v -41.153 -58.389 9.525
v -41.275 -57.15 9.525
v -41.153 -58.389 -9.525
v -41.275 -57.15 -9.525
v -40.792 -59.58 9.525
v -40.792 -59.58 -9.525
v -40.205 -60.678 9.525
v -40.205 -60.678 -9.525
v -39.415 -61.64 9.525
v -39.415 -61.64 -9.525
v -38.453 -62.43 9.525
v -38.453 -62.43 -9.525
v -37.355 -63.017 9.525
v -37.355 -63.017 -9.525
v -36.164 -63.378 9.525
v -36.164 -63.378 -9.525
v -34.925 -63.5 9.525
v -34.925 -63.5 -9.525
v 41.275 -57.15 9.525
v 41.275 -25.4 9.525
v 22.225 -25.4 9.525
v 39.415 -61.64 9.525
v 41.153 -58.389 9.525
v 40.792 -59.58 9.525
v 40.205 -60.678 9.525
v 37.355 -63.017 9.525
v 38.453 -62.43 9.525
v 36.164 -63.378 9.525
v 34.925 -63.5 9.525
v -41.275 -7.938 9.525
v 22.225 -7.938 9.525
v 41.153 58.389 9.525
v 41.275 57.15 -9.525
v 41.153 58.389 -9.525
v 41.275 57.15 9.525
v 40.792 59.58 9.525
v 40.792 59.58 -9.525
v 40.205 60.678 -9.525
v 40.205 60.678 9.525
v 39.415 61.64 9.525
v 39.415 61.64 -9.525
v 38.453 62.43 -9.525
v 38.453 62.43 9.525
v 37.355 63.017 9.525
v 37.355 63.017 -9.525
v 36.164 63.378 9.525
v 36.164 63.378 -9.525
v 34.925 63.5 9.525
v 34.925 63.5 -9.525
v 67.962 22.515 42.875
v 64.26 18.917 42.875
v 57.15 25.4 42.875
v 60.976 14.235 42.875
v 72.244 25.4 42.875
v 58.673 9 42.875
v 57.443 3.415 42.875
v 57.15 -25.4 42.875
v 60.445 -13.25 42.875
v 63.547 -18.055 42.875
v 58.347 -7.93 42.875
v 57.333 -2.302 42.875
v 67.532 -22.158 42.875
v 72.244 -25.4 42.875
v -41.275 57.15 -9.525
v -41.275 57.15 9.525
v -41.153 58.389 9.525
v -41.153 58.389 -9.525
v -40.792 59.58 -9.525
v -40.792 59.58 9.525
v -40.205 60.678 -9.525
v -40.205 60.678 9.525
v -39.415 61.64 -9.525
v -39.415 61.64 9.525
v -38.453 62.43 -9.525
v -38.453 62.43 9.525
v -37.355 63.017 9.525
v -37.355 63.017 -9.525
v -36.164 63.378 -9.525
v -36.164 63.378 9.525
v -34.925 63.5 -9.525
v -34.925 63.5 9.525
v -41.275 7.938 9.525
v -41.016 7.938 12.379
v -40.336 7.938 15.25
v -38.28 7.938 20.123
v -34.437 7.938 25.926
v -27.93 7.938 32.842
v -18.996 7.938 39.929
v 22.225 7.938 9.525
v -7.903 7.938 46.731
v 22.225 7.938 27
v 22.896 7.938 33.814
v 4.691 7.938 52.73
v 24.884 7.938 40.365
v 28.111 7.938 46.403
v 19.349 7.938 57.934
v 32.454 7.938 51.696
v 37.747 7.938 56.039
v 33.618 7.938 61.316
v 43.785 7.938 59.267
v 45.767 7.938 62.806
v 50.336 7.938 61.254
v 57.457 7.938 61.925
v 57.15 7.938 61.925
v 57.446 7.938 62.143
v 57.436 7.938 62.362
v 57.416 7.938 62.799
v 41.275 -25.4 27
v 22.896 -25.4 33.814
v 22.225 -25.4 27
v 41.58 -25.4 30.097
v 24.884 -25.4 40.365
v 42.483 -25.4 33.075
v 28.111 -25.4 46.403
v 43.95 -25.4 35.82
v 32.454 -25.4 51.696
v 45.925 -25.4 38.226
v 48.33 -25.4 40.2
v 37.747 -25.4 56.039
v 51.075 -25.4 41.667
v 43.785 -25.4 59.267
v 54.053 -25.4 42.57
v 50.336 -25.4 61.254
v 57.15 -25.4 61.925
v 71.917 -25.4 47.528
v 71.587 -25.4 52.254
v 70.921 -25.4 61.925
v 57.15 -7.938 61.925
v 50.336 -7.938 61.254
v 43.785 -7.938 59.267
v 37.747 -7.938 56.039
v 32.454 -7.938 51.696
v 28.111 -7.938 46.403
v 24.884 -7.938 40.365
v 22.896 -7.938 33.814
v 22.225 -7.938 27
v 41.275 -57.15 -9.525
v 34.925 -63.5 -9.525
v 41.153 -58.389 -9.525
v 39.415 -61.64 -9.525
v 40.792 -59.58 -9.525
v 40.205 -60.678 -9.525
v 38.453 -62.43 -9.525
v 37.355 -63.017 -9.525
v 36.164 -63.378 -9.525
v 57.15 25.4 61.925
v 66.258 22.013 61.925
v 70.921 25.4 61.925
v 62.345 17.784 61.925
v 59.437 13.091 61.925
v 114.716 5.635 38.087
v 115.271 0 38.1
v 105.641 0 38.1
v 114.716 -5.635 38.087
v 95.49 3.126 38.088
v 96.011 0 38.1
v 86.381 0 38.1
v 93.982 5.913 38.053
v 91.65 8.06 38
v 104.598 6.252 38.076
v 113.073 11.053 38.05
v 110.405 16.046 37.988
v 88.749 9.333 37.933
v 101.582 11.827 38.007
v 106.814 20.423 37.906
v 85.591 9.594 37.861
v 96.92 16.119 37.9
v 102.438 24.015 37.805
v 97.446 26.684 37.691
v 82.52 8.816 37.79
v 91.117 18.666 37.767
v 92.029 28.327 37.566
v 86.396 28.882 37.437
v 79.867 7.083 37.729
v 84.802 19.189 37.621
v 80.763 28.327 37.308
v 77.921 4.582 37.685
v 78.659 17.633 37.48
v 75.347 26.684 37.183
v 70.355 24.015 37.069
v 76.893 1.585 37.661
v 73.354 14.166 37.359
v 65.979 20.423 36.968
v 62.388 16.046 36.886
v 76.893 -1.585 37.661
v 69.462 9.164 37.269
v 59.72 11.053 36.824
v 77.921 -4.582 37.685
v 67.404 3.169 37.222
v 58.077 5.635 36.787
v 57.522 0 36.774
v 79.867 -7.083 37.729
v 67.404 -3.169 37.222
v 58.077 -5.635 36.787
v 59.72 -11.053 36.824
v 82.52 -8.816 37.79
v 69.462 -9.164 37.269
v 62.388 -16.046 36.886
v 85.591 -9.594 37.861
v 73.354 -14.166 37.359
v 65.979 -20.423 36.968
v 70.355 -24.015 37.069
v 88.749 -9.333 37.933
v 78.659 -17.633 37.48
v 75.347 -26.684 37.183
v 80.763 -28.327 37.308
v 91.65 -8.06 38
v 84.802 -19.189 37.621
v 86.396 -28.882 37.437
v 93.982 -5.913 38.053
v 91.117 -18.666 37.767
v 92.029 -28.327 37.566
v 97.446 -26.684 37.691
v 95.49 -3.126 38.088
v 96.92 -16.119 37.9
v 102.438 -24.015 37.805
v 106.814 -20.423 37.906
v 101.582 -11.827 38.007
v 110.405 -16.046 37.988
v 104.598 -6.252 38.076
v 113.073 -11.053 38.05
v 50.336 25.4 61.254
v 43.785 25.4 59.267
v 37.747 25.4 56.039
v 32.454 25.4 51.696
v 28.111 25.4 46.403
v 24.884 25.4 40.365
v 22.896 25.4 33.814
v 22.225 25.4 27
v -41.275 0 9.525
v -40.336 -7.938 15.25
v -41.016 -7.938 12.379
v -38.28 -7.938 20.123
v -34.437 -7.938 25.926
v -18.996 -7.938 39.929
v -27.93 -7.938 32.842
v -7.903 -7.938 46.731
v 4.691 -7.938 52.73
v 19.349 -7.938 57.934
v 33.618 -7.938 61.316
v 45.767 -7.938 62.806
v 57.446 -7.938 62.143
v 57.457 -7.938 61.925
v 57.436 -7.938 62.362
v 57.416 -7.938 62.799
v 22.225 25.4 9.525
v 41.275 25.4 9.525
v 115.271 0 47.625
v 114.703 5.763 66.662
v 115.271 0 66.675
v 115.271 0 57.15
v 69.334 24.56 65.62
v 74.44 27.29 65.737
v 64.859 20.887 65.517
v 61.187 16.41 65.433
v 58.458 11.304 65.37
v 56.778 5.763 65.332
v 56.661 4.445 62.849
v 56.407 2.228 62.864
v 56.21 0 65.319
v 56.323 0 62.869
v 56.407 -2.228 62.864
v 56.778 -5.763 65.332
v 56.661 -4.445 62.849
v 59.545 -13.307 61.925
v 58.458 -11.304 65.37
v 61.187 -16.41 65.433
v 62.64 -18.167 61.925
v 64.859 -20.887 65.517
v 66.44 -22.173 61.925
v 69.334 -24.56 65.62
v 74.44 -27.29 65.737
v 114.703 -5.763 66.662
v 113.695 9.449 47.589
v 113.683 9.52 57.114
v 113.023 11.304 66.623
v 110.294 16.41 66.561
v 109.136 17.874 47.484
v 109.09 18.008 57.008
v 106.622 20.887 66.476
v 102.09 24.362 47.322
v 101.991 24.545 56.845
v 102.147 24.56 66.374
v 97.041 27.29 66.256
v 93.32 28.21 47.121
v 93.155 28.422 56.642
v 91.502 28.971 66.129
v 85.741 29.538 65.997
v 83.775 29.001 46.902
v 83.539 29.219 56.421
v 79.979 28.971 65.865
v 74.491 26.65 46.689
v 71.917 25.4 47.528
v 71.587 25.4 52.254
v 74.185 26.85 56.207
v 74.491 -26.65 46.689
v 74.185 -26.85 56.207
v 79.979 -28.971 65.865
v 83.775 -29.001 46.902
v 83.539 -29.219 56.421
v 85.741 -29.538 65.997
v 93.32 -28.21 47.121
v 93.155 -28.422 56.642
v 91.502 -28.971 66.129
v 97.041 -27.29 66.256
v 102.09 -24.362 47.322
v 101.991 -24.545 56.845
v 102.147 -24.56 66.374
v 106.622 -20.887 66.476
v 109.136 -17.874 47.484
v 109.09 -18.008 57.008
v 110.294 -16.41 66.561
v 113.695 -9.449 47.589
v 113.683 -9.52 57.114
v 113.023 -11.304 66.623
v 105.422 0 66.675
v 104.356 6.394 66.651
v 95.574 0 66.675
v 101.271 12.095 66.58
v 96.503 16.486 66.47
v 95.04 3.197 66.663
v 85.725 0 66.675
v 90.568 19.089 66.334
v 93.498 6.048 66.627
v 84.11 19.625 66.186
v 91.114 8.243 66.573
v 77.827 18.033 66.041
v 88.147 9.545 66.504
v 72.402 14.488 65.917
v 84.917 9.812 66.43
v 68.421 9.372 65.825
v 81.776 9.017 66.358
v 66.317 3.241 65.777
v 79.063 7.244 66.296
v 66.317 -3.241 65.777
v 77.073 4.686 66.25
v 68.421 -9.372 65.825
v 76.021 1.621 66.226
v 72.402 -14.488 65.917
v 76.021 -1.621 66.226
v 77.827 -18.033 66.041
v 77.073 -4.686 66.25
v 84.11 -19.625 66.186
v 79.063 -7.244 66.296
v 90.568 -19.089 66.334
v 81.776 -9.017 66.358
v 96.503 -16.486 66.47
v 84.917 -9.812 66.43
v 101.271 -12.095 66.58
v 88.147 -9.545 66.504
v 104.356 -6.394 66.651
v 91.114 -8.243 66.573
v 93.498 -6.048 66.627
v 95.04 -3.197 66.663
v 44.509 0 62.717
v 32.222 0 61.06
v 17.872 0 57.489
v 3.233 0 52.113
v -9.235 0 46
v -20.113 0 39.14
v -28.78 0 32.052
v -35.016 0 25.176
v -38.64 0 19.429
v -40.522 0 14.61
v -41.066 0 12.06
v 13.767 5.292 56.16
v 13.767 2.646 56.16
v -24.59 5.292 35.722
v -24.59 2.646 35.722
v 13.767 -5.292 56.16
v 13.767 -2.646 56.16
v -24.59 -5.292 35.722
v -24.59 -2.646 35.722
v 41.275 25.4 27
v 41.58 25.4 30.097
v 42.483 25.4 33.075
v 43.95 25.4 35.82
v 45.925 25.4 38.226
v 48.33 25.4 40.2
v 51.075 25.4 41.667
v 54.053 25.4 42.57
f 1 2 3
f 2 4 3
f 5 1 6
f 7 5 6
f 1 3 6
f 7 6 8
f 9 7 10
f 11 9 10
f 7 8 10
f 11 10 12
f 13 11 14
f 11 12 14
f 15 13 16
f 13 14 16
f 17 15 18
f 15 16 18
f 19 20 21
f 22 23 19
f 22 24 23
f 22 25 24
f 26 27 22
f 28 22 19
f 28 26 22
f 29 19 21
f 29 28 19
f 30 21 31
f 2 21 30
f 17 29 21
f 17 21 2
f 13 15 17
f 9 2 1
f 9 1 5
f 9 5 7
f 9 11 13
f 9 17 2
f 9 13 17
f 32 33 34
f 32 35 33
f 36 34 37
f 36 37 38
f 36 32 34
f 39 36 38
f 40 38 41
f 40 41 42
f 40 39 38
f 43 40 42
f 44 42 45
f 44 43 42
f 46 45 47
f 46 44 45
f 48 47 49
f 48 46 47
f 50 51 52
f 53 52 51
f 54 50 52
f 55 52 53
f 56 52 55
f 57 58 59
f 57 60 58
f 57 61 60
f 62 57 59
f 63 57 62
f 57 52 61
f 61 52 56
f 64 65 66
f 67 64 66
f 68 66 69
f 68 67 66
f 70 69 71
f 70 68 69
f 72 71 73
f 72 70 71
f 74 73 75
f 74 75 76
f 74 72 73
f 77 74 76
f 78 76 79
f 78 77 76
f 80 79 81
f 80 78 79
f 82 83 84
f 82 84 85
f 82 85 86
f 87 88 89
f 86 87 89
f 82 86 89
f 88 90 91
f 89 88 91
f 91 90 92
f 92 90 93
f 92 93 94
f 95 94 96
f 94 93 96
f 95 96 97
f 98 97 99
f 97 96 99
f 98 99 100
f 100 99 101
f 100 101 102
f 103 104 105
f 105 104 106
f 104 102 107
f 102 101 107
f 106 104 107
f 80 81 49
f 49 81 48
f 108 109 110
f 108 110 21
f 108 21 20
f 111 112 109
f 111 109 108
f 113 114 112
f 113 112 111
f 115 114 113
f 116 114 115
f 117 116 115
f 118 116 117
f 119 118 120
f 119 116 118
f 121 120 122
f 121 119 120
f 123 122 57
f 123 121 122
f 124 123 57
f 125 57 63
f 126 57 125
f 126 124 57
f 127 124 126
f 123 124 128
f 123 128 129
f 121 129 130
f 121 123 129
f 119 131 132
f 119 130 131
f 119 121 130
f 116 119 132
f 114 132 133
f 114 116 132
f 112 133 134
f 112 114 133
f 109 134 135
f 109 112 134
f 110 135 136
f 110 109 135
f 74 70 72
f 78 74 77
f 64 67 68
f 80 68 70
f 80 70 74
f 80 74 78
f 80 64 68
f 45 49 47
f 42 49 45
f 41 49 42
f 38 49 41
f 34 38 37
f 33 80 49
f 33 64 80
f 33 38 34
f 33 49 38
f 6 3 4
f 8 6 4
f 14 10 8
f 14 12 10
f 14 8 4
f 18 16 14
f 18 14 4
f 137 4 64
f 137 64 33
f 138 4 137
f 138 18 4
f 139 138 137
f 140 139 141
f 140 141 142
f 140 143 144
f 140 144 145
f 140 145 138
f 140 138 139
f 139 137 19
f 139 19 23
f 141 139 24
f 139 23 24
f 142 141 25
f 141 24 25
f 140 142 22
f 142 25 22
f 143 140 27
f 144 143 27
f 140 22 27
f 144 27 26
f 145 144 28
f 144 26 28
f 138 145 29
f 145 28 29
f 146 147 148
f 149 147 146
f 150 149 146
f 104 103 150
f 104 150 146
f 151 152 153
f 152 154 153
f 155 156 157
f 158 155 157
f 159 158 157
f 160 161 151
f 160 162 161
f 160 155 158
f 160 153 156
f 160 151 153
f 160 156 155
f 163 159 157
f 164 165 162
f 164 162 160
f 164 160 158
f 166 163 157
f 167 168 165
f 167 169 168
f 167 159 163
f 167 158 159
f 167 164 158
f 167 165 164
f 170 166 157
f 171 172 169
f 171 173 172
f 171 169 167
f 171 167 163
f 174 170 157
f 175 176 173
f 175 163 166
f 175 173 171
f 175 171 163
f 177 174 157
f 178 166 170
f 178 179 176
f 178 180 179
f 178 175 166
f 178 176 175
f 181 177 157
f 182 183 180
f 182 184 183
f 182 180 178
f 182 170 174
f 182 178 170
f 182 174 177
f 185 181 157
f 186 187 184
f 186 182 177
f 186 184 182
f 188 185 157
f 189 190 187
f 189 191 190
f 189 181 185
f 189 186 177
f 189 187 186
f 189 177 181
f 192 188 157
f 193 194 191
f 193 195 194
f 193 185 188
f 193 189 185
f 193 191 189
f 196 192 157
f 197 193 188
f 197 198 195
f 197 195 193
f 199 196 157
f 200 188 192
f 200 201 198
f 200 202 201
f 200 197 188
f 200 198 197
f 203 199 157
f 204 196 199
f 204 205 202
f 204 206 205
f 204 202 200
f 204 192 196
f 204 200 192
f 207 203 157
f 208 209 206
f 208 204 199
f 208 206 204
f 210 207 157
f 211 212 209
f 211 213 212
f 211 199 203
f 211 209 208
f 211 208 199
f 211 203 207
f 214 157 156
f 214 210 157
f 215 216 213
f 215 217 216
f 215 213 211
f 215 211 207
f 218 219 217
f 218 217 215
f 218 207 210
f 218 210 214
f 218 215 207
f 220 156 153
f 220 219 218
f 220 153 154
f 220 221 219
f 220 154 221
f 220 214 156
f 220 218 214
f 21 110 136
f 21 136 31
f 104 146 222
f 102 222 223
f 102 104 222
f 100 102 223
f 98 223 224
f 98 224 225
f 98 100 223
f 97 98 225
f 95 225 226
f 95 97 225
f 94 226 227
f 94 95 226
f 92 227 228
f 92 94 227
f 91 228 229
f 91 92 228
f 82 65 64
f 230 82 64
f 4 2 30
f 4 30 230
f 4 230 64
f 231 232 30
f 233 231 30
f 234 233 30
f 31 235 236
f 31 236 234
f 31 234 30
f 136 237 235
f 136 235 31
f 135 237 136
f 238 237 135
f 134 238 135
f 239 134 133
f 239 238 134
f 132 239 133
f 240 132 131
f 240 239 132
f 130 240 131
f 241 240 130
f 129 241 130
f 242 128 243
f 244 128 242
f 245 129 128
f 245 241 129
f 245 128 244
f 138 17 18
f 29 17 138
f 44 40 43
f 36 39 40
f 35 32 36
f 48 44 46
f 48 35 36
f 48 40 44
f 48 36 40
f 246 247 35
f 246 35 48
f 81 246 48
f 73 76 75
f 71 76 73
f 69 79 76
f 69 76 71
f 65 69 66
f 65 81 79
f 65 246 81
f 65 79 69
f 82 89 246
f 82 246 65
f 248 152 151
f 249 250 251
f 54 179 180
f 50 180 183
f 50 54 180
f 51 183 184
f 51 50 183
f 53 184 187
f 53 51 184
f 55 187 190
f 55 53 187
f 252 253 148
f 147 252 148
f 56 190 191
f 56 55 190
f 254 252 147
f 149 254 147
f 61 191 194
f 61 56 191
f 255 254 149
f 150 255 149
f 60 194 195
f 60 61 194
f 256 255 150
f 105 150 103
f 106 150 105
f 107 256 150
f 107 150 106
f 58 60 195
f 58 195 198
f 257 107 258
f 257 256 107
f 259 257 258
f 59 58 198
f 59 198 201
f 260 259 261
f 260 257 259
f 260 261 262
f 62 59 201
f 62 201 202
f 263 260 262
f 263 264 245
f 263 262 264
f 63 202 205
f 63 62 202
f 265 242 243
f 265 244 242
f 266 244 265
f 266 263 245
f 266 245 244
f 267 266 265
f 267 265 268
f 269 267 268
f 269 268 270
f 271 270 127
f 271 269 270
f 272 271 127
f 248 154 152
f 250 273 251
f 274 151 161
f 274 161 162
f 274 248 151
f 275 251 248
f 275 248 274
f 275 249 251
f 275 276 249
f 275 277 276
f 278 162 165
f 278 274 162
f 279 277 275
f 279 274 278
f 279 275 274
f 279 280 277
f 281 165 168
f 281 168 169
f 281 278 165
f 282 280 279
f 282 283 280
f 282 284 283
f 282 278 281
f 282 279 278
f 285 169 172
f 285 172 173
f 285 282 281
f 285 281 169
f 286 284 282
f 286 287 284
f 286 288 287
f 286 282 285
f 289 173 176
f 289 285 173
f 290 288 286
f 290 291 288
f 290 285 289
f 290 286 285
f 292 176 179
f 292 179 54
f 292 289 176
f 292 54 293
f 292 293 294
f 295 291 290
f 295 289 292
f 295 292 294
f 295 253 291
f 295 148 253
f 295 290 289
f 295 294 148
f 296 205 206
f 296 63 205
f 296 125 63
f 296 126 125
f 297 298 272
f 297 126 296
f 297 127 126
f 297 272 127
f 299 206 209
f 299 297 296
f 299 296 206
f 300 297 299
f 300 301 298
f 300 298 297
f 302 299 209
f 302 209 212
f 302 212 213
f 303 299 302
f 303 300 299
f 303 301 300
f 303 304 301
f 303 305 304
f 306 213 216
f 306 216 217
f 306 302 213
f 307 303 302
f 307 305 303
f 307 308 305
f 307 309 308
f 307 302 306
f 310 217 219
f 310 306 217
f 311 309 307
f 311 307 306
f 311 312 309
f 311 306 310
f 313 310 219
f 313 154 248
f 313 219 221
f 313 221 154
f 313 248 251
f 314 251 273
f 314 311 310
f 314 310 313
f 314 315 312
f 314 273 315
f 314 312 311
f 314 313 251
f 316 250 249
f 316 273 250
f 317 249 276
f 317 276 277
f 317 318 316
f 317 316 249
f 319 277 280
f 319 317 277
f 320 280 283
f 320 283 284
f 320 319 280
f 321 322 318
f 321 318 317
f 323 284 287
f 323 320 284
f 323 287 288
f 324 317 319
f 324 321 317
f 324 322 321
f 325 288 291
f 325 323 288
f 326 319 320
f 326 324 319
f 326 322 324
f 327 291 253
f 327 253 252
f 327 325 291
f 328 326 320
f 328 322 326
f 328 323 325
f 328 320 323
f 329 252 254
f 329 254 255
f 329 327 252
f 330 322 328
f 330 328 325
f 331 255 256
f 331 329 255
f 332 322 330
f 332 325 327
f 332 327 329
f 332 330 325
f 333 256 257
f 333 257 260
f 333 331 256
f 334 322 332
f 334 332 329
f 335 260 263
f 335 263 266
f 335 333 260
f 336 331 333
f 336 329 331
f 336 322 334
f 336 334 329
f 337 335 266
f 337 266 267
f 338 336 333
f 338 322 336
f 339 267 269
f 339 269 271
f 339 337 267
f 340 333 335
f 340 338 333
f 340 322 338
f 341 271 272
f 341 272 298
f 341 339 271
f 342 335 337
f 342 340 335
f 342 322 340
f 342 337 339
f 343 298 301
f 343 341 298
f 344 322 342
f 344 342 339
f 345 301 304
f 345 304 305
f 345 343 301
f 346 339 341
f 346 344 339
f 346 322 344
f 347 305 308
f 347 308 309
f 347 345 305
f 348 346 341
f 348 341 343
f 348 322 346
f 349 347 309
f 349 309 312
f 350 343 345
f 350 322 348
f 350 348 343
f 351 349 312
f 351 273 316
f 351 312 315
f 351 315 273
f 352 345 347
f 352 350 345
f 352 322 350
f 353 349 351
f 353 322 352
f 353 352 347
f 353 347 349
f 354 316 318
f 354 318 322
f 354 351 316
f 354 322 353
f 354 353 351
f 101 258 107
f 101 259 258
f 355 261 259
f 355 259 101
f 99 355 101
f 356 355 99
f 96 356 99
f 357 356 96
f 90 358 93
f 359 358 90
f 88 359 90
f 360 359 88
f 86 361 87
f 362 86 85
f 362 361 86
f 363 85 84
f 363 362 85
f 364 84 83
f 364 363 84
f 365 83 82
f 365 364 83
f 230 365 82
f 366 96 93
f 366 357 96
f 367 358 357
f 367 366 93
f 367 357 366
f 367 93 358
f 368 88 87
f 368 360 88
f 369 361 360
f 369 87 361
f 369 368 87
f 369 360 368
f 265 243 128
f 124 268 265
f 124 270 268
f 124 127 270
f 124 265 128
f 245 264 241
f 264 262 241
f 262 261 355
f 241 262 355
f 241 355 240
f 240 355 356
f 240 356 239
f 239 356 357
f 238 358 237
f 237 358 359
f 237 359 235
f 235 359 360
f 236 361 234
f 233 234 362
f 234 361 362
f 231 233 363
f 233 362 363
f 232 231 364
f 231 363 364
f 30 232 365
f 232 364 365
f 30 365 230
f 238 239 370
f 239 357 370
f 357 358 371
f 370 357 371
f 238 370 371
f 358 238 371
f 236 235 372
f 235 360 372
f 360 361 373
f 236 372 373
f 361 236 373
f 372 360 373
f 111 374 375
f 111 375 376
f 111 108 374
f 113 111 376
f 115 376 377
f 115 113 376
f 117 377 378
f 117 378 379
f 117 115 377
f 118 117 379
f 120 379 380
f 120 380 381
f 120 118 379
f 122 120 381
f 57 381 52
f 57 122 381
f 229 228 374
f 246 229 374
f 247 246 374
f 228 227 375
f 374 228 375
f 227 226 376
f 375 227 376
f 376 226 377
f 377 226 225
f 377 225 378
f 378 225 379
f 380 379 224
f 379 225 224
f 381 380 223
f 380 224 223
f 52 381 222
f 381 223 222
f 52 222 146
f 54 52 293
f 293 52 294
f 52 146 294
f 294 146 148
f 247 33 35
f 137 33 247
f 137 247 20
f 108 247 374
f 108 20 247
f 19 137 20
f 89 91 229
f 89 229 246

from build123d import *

# Parameters (mm, degrees)
F1_DEPTH = 63.5
F0_W     = 21.2541334692
F0_H     = 19.05
F2_DEPTH = 25.4
F3_DEPTH = 7.9375
F5_R     = 6.35


with BuildPart() as f1:
    # F0 (on Front) → F1 (new body, symmetric)
    with BuildSketch(Plane.XZ):
        Polygon((22.225, 9.525), (-41.275, 9.525), (-41.275, -9.525), (41.275, -9.525), (41.275, 9.525), align=None)
    extrude(amount=F1_DEPTH, both=True)

    # F0 (on Front) → F2 (join, symmetric)
    with BuildSketch(Plane.XZ):
        with Locations((75.0979332654, 52.4002)):
            Rectangle(F0_W, F0_H)
        with BuildLine():
            Line((22.225, 27.0002), (22.225, 9.525))
            Line((22.225, 9.525), (41.275, 9.525))
            Line((41.275, 9.525), (41.275, 27.0002))
            ThreePointArc((41.275, 27.0002), (45.9246798487, 38.2255201513), (57.15, 42.8752))
            Line((57.15, 42.8752), (64.4708665308, 42.8752))
            Line((64.4708665308, 42.8752), (64.4708665308, 61.9252))
            Line((64.4708665308, 61.9252), (57.15, 61.9252))
            ThreePointArc((57.15, 61.9252), (32.4542956671, 51.6959043329), (22.225, 27.0002))
        make_face()
    extrude(amount=F2_DEPTH, both=True)

    # F0 (on Front) → F3 (join, symmetric)
    with BuildSketch(Plane.XZ):
        with BuildLine():
            add(Edge.make_bspline(
                [(64.4708665308, 61.9252), (23.5755275935, 69.2807137966), (-40.8611632884, 37.480790168), (-41.275, 9.525)],
                knots=[0, 0, 0, 0, 118.0168176507, 118.0168176507, 118.0168176507, 118.0168176507], degree=3))
            Line((-41.275, 9.525), (22.225, 9.525))
            Line((22.225, 9.525), (22.225, 27.0002))
            ThreePointArc((22.225, 27.0002), (32.4542956671, 51.6959043329), (57.15, 61.9252))
            Line((57.15, 61.9252), (64.4708665308, 61.9252))
        make_face()
    extrude(amount=F3_DEPTH, both=True)

    # F0 (on Front) → F4 (revolve)
    with BuildSketch(Plane.XZ):
        Polygon((115.2708665308, 66.675), (85.725, 66.675), (86.3811299205, 38.1), (115.2708665308, 38.1), align=None)
    revolve(axis=Axis((86.0530649602, 0, 52.3875), (-0.0229556263, 0, 0.9997364849)))

    # F5
    f5_edges = [f1.edges().sort_by_distance(p)[0] for p in [
        (-41.275, -63.5, 0),
        (41.275, -63.5, 0),
        (41.275, 63.5, 0),
        (-41.275, 63.5, 0),
    ]]
    fillet(f5_edges, radius=F5_R)


solid = f1.part
